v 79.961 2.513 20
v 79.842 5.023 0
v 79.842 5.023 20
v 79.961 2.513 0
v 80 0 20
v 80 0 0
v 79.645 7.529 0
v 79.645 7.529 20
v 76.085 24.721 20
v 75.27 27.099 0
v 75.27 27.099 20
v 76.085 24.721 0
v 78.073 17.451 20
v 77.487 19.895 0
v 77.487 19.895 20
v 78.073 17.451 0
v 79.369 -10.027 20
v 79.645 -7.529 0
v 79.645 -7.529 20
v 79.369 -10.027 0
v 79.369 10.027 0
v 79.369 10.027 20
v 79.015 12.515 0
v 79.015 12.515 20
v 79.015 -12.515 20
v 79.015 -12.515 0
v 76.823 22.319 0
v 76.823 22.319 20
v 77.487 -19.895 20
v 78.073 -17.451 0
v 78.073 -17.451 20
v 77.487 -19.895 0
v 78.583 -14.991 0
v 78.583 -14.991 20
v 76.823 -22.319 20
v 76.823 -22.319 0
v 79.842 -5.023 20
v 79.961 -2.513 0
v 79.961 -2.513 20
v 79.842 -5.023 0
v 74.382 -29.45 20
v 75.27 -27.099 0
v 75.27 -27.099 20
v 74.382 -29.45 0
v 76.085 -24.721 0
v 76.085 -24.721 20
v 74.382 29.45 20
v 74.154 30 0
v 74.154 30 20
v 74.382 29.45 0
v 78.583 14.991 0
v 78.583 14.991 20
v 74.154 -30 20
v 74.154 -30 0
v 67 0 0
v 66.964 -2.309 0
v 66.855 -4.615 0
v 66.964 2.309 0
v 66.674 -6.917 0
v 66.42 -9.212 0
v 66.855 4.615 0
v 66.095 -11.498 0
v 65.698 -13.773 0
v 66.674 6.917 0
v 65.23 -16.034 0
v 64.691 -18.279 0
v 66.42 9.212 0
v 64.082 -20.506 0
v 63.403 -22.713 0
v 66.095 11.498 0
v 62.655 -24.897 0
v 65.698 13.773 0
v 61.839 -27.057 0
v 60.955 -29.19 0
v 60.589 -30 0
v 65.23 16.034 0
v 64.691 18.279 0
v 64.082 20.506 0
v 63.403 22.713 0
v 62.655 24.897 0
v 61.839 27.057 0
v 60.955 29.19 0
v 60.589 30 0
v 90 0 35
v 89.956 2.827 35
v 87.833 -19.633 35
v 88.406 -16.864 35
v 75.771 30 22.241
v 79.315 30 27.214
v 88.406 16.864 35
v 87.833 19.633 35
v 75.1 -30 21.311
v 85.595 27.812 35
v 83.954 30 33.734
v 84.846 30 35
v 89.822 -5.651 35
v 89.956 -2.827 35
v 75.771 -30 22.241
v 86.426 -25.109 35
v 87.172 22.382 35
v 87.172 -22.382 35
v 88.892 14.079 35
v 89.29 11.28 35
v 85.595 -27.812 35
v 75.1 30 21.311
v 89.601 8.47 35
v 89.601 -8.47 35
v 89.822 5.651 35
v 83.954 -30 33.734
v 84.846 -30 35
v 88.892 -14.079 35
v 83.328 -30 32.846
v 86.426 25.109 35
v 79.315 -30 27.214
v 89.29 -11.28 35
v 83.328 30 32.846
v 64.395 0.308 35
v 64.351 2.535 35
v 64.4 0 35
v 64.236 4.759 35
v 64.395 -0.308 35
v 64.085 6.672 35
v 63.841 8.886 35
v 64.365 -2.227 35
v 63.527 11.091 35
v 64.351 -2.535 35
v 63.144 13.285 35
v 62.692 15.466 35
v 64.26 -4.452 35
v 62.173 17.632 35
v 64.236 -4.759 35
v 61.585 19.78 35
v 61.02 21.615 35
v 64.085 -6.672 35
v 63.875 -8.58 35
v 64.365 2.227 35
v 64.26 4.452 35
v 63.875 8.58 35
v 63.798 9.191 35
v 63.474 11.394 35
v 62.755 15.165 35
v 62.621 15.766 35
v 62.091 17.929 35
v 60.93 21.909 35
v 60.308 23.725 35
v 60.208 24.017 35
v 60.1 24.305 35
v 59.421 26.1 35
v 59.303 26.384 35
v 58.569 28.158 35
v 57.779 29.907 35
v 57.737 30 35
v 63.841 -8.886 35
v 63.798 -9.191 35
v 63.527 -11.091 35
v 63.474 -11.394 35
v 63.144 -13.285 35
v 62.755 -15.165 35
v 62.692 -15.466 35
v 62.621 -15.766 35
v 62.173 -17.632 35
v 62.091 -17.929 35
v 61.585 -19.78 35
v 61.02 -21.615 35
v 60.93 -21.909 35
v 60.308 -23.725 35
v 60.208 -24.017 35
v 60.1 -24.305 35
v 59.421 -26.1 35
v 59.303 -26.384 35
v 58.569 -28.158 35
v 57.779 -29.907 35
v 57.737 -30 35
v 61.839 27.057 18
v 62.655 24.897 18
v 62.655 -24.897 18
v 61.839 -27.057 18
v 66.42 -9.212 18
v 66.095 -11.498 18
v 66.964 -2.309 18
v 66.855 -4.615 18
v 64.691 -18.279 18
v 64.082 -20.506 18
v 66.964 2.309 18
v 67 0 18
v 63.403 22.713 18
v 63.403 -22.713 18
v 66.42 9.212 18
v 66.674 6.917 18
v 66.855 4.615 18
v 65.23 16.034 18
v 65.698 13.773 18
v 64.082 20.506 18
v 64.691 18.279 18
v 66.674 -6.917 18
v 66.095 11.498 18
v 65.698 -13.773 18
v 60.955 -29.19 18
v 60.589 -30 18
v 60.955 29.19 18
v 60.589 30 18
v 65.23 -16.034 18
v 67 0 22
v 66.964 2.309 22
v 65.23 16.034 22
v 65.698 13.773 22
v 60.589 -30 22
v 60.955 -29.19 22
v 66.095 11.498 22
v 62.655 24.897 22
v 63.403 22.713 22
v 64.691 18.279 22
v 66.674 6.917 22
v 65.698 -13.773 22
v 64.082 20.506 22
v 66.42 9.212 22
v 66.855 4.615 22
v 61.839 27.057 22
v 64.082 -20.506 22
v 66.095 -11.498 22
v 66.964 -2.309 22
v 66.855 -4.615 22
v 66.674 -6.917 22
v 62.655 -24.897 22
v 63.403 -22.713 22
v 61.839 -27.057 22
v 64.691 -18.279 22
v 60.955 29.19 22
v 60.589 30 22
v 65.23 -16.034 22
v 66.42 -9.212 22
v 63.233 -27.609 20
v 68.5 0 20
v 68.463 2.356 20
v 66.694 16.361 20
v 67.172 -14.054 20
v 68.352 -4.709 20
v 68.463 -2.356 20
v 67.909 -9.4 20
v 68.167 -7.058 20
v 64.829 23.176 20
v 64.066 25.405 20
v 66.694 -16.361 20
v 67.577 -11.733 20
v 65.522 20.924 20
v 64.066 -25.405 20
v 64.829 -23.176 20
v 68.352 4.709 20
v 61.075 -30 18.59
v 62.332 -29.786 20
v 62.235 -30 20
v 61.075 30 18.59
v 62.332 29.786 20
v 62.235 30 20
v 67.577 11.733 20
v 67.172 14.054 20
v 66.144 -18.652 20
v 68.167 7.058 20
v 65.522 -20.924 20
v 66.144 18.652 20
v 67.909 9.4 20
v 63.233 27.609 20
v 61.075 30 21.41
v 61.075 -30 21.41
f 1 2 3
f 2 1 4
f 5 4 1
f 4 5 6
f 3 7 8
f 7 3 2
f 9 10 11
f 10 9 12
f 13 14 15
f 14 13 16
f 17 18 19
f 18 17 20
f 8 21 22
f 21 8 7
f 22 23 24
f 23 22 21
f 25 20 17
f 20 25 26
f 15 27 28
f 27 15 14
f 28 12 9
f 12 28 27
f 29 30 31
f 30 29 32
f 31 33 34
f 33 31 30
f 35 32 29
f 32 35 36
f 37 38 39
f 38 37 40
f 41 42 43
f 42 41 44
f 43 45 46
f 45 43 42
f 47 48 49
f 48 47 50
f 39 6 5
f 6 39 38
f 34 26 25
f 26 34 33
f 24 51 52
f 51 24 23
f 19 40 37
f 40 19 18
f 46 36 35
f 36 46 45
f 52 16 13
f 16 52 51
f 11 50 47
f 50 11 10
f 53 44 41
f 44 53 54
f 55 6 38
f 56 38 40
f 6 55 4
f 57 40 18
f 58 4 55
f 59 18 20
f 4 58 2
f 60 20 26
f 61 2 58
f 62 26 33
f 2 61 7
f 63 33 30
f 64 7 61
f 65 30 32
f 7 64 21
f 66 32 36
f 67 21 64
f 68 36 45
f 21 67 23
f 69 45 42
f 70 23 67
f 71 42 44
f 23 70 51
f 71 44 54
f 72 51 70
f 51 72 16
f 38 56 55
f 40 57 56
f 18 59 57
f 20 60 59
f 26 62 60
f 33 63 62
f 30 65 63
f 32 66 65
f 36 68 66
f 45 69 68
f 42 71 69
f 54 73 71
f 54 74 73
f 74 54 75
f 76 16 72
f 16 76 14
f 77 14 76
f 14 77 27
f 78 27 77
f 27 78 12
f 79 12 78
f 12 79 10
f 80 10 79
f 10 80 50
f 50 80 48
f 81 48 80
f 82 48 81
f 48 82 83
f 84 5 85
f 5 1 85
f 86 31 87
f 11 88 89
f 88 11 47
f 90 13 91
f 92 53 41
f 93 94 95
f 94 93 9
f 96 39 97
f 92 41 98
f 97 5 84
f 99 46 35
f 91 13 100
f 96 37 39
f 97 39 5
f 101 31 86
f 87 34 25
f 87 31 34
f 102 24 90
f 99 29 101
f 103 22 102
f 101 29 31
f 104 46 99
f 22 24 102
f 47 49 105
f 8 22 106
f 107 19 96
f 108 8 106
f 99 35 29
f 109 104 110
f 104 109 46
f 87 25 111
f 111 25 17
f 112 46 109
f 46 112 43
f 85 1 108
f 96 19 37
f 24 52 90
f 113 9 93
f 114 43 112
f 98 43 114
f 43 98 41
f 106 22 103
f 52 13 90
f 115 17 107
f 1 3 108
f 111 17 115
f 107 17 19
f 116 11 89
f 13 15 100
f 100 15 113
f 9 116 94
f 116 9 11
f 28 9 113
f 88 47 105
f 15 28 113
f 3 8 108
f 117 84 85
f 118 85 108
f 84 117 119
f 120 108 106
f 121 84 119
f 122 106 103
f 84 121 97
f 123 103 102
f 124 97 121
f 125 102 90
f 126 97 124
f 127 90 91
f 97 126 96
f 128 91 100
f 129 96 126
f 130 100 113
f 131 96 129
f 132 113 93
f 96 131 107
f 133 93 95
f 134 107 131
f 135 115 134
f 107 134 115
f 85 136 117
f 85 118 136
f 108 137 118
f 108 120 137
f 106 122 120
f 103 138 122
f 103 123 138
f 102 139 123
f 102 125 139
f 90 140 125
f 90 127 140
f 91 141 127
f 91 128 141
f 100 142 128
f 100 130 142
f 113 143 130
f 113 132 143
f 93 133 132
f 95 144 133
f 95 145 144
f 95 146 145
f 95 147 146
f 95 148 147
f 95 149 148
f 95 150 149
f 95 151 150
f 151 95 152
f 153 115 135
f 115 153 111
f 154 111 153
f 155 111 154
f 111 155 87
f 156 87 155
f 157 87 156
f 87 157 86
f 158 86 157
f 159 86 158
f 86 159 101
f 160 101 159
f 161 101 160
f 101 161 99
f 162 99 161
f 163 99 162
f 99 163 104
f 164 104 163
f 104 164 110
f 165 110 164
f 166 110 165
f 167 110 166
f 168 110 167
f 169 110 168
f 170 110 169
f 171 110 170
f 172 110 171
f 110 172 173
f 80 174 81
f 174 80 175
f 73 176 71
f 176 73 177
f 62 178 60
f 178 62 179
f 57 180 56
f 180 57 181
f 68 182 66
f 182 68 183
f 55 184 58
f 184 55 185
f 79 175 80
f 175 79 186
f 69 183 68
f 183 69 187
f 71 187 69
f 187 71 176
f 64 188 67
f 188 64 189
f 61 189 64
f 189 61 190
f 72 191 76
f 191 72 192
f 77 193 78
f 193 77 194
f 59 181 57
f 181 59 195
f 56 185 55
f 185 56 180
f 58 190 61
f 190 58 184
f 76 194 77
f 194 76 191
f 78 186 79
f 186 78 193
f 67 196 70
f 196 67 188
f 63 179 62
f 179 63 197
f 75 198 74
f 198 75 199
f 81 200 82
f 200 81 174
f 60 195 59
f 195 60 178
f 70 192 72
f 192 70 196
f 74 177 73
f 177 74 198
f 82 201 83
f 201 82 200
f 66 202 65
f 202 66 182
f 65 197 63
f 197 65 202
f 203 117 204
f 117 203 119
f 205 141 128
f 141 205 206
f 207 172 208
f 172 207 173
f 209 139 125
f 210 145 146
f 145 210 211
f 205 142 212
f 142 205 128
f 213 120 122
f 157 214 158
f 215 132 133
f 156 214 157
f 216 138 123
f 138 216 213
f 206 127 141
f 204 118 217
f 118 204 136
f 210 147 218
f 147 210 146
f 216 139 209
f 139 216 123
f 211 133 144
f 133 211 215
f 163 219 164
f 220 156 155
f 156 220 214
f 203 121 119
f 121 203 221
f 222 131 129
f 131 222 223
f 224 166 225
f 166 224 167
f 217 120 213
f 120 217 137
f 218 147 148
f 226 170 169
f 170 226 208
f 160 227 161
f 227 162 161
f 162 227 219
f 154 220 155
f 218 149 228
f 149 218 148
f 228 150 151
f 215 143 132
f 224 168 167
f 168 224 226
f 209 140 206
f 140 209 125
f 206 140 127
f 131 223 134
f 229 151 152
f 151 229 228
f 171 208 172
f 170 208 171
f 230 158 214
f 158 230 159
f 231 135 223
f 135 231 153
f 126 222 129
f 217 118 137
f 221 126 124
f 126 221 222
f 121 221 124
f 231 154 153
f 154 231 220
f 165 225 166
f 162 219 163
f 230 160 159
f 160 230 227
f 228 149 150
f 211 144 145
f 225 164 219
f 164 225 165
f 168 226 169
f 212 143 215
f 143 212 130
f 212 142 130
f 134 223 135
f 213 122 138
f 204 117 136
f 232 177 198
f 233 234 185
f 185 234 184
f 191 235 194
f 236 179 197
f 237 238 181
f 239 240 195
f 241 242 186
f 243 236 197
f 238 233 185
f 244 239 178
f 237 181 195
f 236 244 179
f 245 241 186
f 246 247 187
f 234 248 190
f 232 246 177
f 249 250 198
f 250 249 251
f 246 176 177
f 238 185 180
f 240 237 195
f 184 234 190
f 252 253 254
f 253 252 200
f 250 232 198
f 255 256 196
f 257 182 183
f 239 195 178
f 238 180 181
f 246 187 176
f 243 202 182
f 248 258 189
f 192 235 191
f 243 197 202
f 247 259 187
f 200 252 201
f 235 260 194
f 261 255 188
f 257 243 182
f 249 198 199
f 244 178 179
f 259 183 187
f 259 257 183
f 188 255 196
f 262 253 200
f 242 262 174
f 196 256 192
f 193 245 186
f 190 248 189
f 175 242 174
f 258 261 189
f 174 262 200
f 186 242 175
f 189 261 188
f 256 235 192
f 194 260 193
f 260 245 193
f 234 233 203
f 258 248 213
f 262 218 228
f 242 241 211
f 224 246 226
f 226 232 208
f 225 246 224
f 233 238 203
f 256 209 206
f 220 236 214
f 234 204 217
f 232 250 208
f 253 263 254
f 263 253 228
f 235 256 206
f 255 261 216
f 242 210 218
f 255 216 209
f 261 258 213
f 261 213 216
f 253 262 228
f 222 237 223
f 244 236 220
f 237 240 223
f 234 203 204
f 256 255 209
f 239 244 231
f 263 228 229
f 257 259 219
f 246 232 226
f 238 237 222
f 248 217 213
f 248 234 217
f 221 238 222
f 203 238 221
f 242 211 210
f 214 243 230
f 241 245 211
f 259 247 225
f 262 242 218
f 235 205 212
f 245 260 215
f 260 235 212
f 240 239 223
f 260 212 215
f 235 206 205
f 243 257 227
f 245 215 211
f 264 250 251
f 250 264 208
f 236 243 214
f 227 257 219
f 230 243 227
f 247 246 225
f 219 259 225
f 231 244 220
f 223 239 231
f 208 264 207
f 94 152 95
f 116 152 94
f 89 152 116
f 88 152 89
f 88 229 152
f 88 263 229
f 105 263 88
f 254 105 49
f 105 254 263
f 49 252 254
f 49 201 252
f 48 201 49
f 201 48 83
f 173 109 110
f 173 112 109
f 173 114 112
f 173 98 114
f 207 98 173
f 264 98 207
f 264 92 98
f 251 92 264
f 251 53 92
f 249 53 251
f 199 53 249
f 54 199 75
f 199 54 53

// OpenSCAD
HEIGHT = 20;
FUNNEL_HEIGHT = 15;
WIDTH = 60;
COVER_INNER_DIA = 160;
COVER_OUTER_DIA = 180;
POT_OUTER_DIA = 147;
POT_OUTER_LIP_DIA = 150;
POT_LIP_HEIGHT = 4;
POT_LIP_WIDTH = 6;


$fn = 200;

intersection() {
  difference() {
    union() {
        cylinder(d = COVER_INNER_DIA, h = HEIGHT);
        translate([0, 0, HEIGHT])
        cylinder(d1 = COVER_INNER_DIA, d2 = COVER_OUTER_DIA, h = FUNNEL_HEIGHT);
    }
    translate([-(COVER_INNER_DIA-POT_OUTER_DIA)/2, 0, 0])
    cylinder(d = POT_OUTER_DIA, h = HEIGHT - POT_LIP_HEIGHT/2);
    translate([-(COVER_INNER_DIA-POT_OUTER_DIA)/2, 0, HEIGHT + POT_LIP_HEIGHT/2])
    cylinder(d1 = POT_OUTER_DIA, d2 = POT_OUTER_DIA - POT_LIP_WIDTH, h = FUNNEL_HEIGHT);
    translate([-(COVER_INNER_DIA-POT_OUTER_DIA)/2, 0, HEIGHT - POT_LIP_HEIGHT/2])
    cylinder(d1 = POT_OUTER_DIA, d2 = POT_OUTER_LIP_DIA, h = POT_LIP_HEIGHT/2);
    translate([-(COVER_INNER_DIA-POT_OUTER_DIA)/2, 0, HEIGHT])
    cylinder(d2 = POT_OUTER_DIA, d1 = POT_OUTER_LIP_DIA, h = POT_LIP_HEIGHT/2);
  }

  #translate([0, -WIDTH/2, 0])
  cube(size = [COVER_INNER_DIA, WIDTH, HEIGHT + FUNNEL_HEIGHT]);
}
